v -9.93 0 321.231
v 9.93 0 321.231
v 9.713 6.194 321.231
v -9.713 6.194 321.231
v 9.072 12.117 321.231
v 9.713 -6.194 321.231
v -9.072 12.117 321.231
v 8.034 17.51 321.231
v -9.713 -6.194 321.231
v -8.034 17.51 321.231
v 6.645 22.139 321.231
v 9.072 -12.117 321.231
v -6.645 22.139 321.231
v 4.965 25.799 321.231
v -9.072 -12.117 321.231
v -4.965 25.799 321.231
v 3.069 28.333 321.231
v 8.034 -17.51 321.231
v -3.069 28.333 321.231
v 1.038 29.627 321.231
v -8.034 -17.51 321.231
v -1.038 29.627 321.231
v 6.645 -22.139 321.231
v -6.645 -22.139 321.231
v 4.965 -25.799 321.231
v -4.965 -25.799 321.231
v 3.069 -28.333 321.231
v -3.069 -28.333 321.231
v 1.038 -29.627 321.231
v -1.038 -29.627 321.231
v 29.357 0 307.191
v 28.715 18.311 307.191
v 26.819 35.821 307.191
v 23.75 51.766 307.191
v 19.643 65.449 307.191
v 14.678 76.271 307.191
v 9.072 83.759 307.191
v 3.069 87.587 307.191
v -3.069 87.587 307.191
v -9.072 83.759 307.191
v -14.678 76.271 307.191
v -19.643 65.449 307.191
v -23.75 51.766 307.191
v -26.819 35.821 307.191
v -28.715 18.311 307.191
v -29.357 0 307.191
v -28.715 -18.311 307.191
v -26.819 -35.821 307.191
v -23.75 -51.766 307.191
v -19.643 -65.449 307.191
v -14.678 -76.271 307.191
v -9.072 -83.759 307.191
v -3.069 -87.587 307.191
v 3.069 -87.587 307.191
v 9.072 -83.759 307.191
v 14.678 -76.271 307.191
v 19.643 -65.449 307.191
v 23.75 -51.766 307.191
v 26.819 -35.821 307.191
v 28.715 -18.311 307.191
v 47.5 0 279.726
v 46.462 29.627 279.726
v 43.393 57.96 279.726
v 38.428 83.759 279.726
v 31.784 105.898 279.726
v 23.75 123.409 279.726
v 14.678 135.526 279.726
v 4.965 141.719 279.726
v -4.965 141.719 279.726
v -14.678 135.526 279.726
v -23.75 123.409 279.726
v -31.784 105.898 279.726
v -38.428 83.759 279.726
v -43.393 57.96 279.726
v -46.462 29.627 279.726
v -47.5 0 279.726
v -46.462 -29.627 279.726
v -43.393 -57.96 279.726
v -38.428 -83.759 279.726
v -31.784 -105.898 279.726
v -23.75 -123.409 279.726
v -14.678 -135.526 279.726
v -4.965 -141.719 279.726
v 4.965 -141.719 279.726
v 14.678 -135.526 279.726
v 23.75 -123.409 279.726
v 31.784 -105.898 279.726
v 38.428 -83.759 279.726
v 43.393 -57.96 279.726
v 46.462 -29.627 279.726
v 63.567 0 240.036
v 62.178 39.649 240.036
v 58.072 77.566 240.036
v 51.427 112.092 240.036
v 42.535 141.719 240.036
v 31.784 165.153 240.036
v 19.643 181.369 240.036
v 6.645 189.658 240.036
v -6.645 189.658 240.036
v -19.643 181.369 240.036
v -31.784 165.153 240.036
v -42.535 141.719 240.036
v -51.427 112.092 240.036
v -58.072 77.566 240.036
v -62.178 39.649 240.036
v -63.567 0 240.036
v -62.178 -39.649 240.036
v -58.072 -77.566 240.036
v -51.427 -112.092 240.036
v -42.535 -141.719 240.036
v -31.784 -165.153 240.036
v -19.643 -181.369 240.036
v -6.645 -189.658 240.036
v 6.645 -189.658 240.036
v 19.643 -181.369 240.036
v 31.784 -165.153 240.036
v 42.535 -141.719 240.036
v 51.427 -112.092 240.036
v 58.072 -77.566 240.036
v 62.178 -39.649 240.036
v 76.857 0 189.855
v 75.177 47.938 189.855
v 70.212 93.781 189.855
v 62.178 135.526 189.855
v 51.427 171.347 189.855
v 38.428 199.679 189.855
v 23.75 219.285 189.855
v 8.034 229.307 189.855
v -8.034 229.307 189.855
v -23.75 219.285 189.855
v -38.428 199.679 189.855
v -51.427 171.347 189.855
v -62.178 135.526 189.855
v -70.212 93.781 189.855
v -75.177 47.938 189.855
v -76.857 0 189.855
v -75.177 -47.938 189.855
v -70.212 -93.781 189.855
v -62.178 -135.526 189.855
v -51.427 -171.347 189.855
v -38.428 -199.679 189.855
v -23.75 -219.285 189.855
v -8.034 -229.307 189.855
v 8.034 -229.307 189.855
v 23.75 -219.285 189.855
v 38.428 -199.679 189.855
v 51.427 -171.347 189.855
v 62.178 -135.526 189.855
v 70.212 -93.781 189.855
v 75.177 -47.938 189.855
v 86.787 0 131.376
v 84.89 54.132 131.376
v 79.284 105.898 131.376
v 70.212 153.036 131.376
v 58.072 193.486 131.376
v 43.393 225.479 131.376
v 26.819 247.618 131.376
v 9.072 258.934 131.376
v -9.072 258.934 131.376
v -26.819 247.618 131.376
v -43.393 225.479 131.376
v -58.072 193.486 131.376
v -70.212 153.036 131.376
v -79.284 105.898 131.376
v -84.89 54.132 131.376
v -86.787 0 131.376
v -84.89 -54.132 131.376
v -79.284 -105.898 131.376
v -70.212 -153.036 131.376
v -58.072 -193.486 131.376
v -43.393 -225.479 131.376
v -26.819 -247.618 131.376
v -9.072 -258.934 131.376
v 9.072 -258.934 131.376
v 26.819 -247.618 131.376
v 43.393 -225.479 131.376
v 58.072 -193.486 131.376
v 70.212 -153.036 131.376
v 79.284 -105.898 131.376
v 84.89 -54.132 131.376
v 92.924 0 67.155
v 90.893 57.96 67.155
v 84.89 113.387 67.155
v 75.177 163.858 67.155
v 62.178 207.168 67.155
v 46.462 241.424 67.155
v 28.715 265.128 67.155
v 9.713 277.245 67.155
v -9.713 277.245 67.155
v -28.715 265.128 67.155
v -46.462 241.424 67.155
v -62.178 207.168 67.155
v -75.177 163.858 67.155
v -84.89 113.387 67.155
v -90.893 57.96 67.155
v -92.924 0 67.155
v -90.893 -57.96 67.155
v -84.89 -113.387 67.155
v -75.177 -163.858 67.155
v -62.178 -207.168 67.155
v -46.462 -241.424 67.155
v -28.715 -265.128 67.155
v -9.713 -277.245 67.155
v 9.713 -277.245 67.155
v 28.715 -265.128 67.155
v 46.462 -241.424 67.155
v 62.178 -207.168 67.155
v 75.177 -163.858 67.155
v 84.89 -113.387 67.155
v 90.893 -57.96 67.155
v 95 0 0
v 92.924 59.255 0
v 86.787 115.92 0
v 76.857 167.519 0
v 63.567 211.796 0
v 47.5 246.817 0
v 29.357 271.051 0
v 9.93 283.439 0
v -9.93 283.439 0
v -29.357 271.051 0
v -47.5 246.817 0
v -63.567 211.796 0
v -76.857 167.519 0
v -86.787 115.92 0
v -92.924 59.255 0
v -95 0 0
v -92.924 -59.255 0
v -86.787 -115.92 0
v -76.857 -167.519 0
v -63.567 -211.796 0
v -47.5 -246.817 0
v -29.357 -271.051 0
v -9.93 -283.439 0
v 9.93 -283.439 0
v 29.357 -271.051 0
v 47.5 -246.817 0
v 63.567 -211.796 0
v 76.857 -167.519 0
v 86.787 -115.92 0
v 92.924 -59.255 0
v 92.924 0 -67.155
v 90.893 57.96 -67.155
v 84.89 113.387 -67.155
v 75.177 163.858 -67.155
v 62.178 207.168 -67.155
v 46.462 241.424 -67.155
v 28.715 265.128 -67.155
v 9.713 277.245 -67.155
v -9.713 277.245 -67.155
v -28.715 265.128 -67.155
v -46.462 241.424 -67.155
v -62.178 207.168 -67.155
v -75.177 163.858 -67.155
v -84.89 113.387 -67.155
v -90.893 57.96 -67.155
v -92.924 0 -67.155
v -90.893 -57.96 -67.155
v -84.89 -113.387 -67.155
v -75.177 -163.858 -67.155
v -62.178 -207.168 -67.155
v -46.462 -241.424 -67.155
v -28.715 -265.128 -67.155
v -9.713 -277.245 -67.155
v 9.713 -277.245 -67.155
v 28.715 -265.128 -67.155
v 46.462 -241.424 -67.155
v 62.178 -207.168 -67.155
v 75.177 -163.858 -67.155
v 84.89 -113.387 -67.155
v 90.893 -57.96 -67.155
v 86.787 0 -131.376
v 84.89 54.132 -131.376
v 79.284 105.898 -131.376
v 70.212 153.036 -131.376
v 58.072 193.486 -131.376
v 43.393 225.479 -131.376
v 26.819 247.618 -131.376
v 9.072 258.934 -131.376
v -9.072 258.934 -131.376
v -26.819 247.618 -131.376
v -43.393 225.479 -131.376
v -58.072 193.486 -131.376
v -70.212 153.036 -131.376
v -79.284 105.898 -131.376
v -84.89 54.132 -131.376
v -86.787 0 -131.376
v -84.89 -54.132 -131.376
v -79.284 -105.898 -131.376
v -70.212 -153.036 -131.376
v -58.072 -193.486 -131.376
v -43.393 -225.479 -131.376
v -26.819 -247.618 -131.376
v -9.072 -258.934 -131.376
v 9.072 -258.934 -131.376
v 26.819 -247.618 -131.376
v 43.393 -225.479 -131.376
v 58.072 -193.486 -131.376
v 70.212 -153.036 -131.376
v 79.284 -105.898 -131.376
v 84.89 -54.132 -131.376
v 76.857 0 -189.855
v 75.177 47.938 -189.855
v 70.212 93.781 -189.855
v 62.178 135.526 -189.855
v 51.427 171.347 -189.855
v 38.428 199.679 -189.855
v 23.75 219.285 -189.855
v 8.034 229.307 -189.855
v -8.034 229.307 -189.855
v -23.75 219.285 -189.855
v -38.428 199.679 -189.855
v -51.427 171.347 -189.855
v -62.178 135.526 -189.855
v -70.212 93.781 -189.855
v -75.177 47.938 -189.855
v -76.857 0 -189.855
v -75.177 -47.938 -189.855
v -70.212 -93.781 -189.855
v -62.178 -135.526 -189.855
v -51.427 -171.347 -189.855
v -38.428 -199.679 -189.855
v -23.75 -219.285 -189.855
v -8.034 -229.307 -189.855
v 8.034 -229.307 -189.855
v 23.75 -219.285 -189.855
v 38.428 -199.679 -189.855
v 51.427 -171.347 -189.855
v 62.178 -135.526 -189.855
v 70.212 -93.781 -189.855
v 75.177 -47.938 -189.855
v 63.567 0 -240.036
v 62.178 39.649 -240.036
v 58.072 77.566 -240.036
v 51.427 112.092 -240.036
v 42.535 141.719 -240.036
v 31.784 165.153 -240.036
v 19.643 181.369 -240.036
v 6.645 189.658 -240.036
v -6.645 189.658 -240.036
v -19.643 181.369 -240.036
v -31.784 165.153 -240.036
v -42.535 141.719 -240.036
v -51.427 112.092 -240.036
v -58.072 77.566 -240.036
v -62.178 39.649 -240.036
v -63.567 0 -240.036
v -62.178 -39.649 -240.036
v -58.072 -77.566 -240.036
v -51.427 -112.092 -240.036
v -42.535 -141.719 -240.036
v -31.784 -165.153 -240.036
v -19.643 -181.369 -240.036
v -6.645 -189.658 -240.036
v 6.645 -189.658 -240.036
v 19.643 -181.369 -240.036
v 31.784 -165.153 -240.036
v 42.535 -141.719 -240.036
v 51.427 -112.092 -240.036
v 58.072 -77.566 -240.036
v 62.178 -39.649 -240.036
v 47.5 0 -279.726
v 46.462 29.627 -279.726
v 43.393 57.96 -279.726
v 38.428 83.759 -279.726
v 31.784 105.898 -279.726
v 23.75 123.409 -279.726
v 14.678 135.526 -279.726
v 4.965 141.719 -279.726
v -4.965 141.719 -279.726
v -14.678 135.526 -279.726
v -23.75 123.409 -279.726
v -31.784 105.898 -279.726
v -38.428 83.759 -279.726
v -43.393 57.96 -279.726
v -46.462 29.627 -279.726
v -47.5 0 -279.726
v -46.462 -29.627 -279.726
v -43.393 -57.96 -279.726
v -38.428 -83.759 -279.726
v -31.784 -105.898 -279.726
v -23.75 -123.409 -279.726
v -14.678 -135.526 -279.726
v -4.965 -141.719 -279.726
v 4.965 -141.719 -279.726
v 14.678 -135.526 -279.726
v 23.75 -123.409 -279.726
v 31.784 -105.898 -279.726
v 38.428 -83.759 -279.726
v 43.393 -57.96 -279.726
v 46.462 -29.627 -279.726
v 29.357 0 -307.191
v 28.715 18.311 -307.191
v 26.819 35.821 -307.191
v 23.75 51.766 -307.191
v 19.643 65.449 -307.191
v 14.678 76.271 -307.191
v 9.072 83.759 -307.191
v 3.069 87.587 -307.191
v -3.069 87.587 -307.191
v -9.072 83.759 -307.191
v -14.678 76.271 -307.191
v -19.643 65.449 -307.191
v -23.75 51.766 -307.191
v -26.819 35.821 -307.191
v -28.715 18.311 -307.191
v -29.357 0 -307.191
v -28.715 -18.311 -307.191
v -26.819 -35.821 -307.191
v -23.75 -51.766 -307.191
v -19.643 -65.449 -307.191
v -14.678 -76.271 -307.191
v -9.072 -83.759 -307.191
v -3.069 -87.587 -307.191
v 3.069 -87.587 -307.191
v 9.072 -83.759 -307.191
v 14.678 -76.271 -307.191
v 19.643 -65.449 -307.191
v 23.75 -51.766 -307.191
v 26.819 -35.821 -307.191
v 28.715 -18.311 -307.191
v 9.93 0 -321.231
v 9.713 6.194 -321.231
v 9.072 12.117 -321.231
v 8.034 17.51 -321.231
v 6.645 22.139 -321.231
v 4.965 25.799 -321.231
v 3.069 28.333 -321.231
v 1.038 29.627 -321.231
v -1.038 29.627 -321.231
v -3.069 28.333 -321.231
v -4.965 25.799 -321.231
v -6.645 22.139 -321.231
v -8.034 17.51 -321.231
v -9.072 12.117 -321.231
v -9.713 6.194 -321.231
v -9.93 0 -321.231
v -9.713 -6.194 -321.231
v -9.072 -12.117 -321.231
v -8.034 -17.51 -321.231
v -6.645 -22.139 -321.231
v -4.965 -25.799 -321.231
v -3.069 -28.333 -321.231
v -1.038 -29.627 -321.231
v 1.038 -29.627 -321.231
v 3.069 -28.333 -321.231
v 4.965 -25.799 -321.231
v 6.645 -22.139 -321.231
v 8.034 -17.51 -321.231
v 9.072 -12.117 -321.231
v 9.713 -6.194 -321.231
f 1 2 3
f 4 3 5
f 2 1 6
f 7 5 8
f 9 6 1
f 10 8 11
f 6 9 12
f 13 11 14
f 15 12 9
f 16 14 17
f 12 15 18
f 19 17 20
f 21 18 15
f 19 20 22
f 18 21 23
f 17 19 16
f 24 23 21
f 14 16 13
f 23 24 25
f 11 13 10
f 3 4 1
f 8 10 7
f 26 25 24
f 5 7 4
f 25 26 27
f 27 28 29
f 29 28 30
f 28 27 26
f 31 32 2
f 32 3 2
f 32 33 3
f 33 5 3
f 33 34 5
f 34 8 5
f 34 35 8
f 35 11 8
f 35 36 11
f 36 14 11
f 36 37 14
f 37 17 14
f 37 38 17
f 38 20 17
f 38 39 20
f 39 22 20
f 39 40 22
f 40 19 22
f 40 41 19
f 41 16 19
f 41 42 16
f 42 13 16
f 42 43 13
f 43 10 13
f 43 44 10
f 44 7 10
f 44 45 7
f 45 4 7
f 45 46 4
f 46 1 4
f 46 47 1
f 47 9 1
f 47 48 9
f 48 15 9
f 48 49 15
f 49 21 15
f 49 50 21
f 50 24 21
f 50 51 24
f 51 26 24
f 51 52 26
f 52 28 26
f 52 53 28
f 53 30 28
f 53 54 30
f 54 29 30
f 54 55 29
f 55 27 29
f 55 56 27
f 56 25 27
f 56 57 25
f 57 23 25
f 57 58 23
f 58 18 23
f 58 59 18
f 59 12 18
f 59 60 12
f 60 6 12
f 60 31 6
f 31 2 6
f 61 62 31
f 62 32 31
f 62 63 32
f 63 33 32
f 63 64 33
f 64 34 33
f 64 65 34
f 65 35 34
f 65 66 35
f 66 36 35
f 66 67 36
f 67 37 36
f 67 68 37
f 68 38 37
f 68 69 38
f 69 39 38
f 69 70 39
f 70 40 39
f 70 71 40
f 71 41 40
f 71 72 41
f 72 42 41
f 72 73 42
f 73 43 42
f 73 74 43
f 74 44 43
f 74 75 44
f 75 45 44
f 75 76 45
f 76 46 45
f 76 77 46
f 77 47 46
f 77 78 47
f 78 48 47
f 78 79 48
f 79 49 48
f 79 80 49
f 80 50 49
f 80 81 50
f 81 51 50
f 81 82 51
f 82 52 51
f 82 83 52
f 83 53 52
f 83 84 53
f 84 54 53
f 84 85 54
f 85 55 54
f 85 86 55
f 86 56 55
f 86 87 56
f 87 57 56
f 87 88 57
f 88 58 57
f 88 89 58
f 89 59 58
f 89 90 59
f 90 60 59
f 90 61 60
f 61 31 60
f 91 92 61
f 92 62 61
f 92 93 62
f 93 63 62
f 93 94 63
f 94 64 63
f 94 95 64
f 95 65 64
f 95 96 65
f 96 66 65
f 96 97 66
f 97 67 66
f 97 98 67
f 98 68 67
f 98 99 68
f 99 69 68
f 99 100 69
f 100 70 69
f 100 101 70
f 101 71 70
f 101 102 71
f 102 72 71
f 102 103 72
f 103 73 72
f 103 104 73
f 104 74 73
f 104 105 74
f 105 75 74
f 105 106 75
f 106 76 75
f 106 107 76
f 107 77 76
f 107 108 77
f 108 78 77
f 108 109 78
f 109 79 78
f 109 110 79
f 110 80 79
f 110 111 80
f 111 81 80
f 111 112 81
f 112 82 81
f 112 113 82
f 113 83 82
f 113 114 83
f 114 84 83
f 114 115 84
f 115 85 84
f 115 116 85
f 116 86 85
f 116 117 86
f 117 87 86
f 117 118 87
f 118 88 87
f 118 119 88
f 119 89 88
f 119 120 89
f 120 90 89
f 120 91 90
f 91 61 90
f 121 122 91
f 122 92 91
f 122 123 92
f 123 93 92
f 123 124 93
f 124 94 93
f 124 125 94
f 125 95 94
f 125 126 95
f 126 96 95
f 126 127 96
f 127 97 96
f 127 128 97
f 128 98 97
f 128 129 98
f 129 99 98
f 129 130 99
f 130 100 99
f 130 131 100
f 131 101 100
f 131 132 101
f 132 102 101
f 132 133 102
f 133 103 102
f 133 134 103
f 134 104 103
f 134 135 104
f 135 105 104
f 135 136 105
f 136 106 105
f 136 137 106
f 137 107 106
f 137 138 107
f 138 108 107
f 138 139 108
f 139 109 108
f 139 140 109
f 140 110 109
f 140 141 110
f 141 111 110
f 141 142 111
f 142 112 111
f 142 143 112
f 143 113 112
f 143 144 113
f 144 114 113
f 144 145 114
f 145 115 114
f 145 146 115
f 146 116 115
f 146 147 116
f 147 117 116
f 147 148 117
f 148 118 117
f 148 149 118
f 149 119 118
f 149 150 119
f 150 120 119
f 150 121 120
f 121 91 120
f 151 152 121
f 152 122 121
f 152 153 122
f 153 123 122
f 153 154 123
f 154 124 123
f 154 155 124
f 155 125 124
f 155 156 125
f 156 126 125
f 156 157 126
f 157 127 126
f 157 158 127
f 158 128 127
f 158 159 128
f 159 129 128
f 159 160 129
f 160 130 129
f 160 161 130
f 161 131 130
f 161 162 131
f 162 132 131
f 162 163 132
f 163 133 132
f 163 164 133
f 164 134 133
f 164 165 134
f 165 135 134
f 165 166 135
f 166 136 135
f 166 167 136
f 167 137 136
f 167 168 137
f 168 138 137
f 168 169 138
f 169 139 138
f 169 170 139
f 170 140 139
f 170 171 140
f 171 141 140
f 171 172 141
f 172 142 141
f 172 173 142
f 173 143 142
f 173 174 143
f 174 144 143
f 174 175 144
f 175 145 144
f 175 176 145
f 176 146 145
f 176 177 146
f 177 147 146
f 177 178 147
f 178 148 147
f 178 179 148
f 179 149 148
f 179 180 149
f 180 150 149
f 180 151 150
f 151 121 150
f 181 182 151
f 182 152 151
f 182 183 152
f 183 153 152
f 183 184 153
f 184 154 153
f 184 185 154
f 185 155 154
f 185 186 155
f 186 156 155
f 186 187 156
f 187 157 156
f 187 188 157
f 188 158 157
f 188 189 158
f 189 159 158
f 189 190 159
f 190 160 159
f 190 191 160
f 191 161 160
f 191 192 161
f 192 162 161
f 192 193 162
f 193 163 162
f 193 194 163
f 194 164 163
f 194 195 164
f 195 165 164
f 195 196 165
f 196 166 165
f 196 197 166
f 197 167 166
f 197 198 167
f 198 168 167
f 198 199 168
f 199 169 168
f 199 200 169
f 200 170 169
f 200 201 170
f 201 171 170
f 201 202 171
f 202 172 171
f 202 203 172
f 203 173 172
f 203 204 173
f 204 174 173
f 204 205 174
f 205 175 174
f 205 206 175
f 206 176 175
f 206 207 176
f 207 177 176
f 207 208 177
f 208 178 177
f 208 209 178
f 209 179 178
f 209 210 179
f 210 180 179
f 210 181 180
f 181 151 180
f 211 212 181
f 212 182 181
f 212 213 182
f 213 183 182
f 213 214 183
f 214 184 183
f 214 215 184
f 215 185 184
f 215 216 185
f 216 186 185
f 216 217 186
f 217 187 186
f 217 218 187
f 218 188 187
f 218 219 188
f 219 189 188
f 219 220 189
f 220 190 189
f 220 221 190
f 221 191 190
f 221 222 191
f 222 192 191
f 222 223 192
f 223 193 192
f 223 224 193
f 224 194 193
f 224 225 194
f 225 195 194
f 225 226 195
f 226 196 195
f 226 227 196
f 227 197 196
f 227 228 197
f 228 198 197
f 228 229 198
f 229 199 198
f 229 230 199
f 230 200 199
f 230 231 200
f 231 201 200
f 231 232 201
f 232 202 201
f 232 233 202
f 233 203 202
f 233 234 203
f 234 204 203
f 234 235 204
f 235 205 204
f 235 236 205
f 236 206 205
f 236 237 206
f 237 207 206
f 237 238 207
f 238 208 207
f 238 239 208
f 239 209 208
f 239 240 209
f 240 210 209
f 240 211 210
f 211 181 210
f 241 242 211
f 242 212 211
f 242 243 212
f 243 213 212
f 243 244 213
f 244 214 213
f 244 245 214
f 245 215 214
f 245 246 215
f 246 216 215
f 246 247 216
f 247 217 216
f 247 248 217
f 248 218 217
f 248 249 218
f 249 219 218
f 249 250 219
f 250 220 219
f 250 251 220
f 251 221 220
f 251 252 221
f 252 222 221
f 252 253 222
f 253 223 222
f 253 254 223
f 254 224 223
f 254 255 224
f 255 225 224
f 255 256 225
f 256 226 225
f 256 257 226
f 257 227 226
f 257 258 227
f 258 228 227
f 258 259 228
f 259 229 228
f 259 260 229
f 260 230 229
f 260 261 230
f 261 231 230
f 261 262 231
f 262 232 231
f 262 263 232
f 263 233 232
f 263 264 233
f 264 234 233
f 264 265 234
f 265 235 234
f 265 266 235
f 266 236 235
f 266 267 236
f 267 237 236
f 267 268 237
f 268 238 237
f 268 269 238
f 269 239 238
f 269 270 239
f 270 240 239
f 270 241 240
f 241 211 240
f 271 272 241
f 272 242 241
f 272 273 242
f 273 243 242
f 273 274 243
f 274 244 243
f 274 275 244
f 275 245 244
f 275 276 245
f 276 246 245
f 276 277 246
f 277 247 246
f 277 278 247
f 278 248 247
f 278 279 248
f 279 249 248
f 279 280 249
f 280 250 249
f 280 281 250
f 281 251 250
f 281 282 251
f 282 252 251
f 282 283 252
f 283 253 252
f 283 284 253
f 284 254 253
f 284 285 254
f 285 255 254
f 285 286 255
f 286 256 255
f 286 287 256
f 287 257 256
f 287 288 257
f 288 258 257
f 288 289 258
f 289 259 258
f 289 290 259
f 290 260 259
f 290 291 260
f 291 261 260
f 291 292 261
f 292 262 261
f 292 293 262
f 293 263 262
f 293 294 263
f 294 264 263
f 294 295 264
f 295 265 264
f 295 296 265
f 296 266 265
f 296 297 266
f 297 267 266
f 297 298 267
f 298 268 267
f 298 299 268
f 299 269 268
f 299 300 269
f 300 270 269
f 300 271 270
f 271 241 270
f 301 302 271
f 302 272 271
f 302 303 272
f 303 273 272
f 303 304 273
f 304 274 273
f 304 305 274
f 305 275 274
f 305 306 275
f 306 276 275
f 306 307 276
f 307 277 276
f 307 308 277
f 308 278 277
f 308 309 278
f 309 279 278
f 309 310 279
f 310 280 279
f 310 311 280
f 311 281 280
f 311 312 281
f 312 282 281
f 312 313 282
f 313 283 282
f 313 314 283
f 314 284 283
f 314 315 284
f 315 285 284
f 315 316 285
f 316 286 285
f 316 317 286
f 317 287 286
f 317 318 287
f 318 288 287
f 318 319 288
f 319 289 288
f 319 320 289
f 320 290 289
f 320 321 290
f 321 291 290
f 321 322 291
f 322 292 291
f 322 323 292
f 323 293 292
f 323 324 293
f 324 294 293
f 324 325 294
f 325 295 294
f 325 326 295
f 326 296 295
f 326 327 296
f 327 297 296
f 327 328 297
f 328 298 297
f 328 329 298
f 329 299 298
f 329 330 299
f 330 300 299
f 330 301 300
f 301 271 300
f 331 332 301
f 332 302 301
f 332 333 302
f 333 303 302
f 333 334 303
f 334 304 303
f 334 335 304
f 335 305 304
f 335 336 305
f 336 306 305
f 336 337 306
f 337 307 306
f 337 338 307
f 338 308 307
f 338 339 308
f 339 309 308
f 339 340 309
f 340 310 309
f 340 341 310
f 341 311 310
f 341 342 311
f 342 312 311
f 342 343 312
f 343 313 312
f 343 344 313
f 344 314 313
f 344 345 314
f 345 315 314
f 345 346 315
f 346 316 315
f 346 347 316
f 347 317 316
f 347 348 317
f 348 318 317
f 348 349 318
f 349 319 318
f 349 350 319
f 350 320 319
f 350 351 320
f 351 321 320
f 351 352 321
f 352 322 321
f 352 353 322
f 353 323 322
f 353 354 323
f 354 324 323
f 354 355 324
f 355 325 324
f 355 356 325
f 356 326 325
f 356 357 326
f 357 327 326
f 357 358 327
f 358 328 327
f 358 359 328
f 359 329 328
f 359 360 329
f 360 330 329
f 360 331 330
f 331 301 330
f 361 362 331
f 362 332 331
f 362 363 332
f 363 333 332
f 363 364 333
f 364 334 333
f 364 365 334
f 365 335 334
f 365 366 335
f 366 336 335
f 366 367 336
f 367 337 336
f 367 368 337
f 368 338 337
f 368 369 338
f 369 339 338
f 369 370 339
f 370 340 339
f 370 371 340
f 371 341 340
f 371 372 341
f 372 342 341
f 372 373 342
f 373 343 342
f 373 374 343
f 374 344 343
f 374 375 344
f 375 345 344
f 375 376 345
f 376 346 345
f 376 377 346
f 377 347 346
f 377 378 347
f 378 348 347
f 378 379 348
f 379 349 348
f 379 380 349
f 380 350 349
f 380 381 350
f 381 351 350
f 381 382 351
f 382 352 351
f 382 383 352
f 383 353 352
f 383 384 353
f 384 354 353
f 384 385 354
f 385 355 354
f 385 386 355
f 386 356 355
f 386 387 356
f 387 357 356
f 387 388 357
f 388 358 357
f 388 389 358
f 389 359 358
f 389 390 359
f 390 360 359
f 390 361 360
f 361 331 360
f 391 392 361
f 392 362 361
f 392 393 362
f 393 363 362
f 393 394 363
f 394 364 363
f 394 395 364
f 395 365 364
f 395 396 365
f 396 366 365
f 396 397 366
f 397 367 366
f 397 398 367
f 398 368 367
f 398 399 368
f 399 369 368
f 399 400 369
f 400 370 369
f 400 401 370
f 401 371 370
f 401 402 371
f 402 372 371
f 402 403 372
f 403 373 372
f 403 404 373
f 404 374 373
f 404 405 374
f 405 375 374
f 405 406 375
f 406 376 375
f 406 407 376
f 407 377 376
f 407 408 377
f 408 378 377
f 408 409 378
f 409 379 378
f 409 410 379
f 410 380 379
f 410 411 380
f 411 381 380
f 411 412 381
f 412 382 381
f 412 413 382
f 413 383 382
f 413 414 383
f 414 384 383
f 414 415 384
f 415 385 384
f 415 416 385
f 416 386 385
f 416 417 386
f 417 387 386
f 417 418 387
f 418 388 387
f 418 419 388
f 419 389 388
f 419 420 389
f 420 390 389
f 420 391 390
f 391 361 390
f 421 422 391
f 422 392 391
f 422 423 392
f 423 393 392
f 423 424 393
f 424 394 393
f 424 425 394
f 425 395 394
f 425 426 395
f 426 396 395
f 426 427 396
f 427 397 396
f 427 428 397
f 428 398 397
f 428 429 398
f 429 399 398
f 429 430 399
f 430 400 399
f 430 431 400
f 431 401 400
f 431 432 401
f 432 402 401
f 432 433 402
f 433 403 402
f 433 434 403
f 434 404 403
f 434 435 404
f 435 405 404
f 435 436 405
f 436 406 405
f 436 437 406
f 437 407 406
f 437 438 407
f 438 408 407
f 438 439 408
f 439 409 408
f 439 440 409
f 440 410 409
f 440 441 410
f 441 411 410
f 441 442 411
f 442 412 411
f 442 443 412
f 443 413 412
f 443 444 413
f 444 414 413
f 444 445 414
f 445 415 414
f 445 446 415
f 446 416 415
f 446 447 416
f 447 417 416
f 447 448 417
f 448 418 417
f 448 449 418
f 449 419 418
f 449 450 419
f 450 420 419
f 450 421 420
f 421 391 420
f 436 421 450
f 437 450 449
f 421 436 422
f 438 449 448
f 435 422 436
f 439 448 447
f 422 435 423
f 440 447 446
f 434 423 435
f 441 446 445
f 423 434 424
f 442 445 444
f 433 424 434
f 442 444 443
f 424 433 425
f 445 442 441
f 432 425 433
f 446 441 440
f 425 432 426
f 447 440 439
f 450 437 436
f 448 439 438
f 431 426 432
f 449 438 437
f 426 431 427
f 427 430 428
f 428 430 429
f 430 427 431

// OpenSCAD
// Generated by SolidPython 1.0.1 on 2020-07-29 00:46:46


scale(v = [5, 15, 17]) {
	sphere(r = 19);
}
/***********************************************
*********      SolidPython code:      **********
************************************************
 
# import packages: SolidPython
from solid import *
from solid.utils import *
from itertools import chain, combinations, permutations


class Resize:

    def __init__(self, scad_file):
        self.scad_file = scad_file
        #self.scad_file = import_scad(scad_file)
        # cone/cylinder param:
        self.r1 = 0
        self.r2 = 0
        self.h = 0
        # rectangular prism param:
        self.w = 0
        self.l = 0
        # ellipse param:
        self.r = 0

    # import OpenScad code (file name corresponds to shape)


    # classify shape + parameters
    def assign(self, param1, param2, param3):
        if self.scad_file == 'cone.scad':
            self.r1 = param1
            self.r2 = param2
            self.h = param3
        elif self.scad_file == 'cylinder.scad':
            self.r1 = param1
            self.r2 = param2
            self.h = param3
        elif self.scad_file == 'rectangularPrism.scad':
            self.h = param1
            self.l = param2
            self.w = param3
        else:
            self.r = param1
            self.h = param2

    # resize parameters
    def iterate(self):
        x = range(3, 20, 2)
        i = 1
        if self.scad_file == 'cone.scad':
            tempList = list(permutations(x, 2))
            for temp in tempList:
                param1 = temp[0]
                param2 = temp[1]
                filepath = 'produced_scad_files/' + 'cone' + str(param1) + '_' + str(param2) + '_' + '.scad'
                scad_render_to_file(cylinder(h=param1, r1=param2, r2=0), filepath)

        elif self.scad_file == 'cylinder.scad':
            tempList = list(permutations(x, 3))
            for temp in tempList:
                param1 = temp[0]
                param2 = temp[1]
                filepath = 'produced_scad_files/' + 'cylinder' + str(param1) + '_' + str(param2) + '_' + '.scad'
                scad_render_to_file(cylinder(h=param1, r1=param2, r2=param2), filepath)

        elif self.scad_file == 'rectangularPrism.scad':
            tempList = list(permutations(x, 3))
            for temp in tempList:
                param1 = temp[0]
                param2 = temp[1]
                param3 = temp[2]
                filepath = 'produced_scad_files/' + 'rectangularPrism' + str(param1) + '_' + str(param2) + '_' + str(
                    param3) + '.scad'
                scad_render_to_file(cube(size=(param1, param2, param3)), filepath)

        elif self.scad_file == 'ellipse.scad':
            tempList = list(permutations(x, 4))
            for temp in tempList:
                param1 = temp[0]
                param2 = temp[1]
                param3 = temp[2]
                param4 = temp[3]
                filepath = 'produced_scad_files/' + 'ellipse' + str(param1) + '_' + str(param2) + '_' + str(param3) + '_' + str(param4) + '.scad'
                scad_render_to_file(scale([param1, param2, param3])(sphere(r=param4)), filepath)

    def render_to_scadfile(self):
        scad_render_to_file(scad, 'example.scad') 
 
************************************************/
